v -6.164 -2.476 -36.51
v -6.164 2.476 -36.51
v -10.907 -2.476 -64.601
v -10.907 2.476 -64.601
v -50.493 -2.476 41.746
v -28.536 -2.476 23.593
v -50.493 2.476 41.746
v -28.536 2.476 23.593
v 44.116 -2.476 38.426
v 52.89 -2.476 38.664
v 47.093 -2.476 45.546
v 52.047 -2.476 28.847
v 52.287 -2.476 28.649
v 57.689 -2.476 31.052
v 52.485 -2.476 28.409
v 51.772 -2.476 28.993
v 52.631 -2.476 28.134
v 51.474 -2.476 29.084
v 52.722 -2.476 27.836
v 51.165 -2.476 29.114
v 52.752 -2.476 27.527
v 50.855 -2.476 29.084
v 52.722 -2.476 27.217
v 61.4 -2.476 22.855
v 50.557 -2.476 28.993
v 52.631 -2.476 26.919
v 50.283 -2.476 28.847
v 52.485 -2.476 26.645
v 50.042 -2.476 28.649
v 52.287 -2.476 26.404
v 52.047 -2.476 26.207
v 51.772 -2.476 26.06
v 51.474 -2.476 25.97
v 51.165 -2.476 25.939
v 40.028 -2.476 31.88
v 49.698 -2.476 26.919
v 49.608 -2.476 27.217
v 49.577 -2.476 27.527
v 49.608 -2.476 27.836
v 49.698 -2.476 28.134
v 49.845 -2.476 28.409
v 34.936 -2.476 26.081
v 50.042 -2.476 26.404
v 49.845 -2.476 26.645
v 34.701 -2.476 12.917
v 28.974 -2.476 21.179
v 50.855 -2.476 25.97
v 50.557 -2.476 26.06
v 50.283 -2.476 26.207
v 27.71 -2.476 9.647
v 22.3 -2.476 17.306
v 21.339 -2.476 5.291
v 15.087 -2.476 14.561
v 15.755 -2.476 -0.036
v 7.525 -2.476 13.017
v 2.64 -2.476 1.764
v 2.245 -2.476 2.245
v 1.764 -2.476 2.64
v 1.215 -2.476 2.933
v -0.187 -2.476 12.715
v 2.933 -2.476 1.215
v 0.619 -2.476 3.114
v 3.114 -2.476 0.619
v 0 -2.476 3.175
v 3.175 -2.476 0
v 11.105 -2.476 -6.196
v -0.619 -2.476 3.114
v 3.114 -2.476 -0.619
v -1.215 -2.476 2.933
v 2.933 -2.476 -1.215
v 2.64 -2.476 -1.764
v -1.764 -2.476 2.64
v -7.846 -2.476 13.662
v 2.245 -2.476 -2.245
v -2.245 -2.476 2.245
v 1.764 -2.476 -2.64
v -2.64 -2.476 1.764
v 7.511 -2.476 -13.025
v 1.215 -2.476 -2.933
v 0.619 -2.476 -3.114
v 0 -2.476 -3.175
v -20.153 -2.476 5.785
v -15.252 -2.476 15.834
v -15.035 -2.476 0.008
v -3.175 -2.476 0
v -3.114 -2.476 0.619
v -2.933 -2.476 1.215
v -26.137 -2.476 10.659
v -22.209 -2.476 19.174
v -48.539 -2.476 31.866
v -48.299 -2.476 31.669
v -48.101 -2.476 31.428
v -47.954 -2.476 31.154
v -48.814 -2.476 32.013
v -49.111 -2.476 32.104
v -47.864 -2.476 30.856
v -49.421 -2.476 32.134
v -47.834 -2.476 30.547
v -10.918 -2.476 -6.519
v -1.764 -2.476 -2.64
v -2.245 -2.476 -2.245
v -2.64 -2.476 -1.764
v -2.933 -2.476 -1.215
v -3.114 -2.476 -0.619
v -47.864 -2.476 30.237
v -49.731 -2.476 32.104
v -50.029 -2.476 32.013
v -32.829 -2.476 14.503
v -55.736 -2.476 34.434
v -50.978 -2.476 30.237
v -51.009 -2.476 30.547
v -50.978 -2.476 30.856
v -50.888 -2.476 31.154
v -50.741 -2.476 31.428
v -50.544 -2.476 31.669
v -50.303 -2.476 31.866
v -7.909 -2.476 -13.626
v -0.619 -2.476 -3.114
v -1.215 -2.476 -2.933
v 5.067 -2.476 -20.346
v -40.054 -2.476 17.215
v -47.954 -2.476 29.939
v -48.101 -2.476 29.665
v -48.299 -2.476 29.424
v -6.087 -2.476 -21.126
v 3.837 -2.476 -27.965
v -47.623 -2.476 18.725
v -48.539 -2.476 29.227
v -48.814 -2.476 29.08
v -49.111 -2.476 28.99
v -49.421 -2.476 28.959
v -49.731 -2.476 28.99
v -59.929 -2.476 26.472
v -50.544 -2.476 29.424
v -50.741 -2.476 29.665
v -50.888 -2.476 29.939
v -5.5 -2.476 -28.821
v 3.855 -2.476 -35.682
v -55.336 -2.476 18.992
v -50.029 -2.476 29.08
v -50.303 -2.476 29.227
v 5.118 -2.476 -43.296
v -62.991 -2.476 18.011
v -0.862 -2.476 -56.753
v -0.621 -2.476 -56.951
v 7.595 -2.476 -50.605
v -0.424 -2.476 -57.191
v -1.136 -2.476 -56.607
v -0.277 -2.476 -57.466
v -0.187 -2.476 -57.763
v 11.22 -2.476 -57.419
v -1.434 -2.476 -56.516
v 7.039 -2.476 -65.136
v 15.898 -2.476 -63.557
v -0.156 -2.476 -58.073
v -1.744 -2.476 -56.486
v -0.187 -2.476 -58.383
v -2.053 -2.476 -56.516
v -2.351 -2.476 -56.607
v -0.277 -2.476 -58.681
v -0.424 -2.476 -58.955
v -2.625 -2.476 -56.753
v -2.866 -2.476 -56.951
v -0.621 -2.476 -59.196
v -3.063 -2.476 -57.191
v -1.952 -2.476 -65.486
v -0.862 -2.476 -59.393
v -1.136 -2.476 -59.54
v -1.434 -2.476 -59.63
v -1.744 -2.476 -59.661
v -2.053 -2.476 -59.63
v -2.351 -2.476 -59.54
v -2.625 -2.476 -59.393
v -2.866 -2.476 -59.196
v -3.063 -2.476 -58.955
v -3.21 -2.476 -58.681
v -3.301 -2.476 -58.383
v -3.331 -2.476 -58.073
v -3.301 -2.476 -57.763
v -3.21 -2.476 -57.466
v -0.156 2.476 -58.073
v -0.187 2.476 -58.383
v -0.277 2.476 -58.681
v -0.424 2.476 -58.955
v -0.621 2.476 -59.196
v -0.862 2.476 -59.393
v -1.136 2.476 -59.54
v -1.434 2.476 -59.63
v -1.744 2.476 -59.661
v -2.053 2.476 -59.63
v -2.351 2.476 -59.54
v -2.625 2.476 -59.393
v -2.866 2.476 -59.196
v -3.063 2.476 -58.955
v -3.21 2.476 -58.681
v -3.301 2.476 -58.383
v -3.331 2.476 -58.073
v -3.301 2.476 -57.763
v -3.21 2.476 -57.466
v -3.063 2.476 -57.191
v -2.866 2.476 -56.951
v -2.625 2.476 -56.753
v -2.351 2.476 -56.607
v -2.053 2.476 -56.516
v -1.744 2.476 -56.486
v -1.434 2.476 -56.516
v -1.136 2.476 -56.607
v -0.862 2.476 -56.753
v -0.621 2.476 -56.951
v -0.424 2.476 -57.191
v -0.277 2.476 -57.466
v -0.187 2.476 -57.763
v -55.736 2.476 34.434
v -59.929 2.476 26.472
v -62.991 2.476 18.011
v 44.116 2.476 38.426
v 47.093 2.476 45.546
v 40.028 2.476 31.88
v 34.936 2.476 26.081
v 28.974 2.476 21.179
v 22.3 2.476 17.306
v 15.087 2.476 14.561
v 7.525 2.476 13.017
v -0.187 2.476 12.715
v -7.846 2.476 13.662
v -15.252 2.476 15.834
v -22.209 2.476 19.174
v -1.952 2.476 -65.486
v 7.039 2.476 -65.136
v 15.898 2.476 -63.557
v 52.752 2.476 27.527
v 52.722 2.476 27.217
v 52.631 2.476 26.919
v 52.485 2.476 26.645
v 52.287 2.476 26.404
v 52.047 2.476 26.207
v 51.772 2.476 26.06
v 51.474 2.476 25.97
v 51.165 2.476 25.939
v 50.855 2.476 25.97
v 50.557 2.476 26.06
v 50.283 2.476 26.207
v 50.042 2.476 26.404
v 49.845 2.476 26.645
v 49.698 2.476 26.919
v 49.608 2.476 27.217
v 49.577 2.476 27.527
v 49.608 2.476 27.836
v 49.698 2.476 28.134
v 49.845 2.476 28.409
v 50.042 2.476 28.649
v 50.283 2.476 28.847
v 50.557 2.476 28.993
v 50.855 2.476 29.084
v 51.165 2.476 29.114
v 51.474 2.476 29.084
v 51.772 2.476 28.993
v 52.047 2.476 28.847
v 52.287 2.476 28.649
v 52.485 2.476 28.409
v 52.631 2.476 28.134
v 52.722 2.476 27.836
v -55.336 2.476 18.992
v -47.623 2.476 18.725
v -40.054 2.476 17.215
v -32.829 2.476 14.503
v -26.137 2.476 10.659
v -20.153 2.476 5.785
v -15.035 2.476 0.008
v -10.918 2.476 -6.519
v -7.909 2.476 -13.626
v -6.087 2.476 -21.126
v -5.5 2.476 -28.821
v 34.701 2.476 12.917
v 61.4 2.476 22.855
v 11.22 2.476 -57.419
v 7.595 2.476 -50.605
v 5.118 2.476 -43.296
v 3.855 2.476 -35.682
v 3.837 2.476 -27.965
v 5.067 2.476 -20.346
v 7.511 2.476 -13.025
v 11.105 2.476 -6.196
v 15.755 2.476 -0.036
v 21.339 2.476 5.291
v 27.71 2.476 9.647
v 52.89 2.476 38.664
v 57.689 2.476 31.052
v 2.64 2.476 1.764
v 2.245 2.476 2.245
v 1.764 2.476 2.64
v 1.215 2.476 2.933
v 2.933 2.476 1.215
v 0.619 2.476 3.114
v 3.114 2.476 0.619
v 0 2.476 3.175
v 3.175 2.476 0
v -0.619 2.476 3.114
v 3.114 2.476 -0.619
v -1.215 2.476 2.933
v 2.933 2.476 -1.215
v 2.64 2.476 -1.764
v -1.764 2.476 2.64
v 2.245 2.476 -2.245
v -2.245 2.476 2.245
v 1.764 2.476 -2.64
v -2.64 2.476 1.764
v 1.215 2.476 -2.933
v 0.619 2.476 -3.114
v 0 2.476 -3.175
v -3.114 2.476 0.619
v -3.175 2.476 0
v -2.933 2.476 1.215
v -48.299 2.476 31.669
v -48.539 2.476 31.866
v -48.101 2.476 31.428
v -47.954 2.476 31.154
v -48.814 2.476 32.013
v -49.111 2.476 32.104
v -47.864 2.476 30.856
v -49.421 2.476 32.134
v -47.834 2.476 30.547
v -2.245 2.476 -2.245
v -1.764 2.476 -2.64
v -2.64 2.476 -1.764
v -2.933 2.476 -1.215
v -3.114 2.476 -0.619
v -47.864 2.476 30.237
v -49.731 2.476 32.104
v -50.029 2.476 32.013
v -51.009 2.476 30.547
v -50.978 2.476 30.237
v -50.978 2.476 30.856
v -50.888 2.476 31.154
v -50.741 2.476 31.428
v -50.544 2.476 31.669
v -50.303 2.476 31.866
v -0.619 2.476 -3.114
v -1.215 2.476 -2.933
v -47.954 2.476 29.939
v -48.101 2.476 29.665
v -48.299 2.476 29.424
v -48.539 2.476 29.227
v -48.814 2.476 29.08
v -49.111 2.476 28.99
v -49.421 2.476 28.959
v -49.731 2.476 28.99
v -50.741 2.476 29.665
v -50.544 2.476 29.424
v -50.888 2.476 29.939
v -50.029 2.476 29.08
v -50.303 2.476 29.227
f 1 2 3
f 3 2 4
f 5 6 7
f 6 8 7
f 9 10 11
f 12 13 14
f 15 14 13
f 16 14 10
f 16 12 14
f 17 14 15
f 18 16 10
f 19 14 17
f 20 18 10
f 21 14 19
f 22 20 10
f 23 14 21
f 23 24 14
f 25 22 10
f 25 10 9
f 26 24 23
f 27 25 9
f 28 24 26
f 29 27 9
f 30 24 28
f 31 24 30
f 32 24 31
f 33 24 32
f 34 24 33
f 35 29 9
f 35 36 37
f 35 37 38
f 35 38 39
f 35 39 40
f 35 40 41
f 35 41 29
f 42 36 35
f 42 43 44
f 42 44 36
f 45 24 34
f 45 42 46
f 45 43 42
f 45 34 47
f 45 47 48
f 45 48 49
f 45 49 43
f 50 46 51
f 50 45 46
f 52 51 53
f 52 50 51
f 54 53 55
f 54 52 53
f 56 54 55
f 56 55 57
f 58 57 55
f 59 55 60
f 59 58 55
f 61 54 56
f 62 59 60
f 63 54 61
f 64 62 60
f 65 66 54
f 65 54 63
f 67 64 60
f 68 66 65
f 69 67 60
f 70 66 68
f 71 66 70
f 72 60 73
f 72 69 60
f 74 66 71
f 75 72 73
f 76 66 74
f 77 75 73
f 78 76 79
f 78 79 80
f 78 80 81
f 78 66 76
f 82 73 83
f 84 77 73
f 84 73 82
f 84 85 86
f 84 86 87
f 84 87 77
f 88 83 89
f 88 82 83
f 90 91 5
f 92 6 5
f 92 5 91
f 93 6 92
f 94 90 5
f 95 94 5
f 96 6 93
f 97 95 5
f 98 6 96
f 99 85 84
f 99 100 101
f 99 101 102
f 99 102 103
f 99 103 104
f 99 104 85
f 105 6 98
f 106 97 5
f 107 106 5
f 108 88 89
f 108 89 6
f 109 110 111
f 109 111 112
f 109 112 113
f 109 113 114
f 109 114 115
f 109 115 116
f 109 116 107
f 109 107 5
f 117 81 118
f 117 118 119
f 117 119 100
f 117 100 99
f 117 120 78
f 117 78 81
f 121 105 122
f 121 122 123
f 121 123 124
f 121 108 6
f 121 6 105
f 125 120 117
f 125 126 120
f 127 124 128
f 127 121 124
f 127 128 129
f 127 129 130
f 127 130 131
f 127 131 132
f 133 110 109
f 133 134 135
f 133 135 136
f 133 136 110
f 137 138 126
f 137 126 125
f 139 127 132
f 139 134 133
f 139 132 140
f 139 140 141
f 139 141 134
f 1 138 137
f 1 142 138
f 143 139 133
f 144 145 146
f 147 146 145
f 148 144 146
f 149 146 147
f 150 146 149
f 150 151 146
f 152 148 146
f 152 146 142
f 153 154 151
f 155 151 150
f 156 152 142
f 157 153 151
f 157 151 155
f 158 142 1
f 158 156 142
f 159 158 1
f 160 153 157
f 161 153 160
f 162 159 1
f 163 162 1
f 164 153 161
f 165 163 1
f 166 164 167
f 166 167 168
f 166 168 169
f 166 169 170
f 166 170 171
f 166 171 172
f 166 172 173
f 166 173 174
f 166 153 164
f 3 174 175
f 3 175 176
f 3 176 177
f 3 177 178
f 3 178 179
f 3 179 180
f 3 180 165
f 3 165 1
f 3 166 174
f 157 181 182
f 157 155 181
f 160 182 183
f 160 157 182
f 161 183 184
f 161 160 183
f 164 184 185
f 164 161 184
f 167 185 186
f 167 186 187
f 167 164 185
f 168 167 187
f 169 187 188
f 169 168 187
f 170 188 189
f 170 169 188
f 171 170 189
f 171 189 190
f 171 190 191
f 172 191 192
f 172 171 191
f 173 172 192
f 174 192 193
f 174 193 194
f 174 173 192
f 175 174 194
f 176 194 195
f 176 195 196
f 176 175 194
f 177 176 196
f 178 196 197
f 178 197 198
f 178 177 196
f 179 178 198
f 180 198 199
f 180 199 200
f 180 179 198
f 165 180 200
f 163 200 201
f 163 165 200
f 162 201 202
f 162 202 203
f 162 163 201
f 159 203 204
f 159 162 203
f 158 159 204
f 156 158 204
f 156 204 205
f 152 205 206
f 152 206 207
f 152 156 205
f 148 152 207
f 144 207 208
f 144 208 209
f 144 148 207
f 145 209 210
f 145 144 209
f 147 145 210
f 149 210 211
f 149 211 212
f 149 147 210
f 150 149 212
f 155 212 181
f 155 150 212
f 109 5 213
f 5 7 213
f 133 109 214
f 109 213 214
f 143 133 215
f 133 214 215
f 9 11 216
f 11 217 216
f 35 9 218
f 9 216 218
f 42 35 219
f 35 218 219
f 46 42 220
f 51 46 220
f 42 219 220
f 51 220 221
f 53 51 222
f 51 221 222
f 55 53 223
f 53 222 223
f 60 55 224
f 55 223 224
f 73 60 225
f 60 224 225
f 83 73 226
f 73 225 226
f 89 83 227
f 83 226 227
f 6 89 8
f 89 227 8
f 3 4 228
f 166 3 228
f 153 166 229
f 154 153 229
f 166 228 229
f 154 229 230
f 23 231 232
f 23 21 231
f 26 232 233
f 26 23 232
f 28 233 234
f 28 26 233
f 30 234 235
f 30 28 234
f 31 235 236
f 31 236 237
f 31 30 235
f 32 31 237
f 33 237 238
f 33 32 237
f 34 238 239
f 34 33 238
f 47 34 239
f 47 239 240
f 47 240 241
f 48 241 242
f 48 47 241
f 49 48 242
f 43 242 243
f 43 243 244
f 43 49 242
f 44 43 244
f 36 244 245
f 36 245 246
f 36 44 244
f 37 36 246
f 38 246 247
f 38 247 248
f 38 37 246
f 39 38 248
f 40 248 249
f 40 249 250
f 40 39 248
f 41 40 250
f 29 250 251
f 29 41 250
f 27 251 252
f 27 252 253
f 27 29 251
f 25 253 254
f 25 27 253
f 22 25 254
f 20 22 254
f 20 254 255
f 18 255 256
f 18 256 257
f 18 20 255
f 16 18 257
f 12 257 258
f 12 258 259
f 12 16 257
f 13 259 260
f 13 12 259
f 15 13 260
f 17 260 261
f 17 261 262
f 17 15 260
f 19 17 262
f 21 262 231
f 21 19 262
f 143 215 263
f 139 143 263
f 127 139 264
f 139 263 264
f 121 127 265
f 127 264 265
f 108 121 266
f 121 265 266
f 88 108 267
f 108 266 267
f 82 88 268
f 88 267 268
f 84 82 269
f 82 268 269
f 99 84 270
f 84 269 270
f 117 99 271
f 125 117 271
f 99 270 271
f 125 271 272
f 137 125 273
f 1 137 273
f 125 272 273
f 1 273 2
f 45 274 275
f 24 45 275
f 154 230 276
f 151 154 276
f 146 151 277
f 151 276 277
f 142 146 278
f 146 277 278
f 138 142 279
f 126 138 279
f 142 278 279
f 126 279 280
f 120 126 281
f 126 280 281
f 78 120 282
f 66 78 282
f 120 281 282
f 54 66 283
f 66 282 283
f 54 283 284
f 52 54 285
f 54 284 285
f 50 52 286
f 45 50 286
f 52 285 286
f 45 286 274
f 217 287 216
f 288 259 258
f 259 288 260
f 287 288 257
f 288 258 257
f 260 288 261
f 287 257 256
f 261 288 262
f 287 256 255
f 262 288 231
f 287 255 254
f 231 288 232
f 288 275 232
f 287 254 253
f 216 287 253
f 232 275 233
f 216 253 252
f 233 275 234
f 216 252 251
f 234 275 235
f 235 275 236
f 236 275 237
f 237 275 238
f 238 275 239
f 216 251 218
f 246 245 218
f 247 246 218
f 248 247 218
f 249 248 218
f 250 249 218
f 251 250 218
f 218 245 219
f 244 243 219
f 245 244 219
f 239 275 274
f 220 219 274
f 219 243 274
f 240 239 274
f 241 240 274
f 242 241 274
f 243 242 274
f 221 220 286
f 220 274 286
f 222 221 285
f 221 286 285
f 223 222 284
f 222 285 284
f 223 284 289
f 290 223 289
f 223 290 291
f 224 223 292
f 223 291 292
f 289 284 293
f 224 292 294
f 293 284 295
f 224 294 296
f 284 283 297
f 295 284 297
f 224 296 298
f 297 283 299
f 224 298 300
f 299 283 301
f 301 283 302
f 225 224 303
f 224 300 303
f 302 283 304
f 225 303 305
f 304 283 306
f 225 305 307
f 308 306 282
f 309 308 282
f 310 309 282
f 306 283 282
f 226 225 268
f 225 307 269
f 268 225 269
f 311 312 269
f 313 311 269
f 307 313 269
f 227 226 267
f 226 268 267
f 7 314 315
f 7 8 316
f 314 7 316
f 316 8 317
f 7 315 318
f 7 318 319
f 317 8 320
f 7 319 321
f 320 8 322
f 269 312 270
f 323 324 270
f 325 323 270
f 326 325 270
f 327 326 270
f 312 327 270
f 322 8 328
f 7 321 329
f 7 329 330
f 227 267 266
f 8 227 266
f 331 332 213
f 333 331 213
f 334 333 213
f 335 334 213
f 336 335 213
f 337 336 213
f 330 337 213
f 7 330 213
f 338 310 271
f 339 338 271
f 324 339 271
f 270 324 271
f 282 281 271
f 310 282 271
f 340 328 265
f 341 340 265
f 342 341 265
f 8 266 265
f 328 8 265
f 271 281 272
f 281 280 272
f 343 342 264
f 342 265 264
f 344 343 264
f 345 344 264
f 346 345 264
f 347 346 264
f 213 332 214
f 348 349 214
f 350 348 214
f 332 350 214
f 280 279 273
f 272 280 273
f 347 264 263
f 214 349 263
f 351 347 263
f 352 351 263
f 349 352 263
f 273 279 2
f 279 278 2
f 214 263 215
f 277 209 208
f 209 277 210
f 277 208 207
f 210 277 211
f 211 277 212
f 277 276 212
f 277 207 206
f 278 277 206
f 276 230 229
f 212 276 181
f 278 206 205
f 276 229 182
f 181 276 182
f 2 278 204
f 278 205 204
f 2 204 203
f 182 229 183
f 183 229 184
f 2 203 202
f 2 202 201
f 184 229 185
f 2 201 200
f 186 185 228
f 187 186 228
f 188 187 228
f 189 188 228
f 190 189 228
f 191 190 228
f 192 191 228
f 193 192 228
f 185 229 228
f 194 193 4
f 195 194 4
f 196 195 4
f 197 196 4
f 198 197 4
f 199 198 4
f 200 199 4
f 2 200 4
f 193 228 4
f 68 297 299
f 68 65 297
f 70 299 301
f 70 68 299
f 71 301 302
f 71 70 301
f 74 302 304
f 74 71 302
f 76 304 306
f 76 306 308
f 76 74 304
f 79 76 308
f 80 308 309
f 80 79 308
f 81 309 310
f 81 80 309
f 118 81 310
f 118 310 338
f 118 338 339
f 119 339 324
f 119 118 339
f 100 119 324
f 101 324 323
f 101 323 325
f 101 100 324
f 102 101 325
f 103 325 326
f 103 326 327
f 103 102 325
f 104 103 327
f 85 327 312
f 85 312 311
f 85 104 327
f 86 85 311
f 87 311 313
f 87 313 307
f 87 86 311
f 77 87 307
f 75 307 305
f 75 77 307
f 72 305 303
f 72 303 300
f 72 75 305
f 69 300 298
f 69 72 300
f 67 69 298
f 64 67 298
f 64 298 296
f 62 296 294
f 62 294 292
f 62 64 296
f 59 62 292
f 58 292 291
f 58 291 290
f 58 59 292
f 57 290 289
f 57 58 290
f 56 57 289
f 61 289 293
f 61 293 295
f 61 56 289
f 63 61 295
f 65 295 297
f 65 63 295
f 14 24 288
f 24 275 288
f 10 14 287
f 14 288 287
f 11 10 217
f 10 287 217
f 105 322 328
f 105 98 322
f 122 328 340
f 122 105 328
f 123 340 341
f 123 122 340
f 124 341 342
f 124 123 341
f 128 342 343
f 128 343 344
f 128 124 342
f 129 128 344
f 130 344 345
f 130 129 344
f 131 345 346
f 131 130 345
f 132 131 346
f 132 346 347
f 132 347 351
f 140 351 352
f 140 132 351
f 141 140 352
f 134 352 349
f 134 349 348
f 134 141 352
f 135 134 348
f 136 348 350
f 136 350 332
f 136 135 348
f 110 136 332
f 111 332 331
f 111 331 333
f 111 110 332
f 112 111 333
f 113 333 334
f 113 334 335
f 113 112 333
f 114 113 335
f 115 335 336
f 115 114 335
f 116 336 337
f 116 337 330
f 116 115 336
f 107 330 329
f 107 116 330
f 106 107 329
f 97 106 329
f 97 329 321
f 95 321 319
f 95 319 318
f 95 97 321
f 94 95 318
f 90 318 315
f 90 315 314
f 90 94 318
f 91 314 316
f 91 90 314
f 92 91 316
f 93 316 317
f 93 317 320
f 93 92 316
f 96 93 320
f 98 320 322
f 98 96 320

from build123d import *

# Parameters (mm, degrees)
SKETCH1_R           = 3.175
SKETCH1_R_2         = 1.5875
BOSS_EXTRUDE1_DEPTH = 2.4765


with BuildPart() as part:
    # Sketch1 → Boss-Extrude1 (new, symmetric)
    with BuildSketch(Plane(origin=(0, 0, 0), x_dir=(1, 0, 0), z_dir=(0, 1, 0))):
        with BuildLine():
            Line((34.700549349, -12.916534941), (61.399556839, -22.854667611))
            ThreePointArc((61.399556839, -22.854667611), (55.420174256, -34.940602415), (47.093148029, -45.546424892))
            ThreePointArc((47.093148029, -45.546424892), (15.086508303, -14.560725649), (-28.536322062, -23.593289791))
            Line((-28.536322062, -23.593289791), (-50.492501165, -41.746242199))
            ThreePointArc((-50.492501165, -41.746242199), (-57.969536443, -30.52497758), (-62.990935022, -18.010650091))
            ThreePointArc((-62.990935022, -18.010650091), (-20.153212462, -5.78493662), (-6.164227287, 36.509824732))
            Line((-6.164227287, 36.509824732), (-10.907055674, 64.600909809))
            ThreePointArc((-10.907055674, 64.600909809), (2.549362187, 65.465579995), (15.897786993, 63.557074983))
            ThreePointArc((15.897786993, 63.557074983), (5.066704158, 20.34566227), (34.700549349, -12.916534941))
        make_face()
        Circle(SKETCH1_R, mode=Mode.SUBTRACT)
        with Locations((-1.743506635, 58.073174541)):
            Circle(SKETCH1_R_2, mode=Mode.SUBTRACT)
        with Locations((-49.421091113, -30.546508308)):
            Circle(SKETCH1_R_2, mode=Mode.SUBTRACT)
        with Locations((51.164597749, -27.526666233)):
            Circle(SKETCH1_R_2, mode=Mode.SUBTRACT)
    extrude(amount=BOSS_EXTRUDE1_DEPTH, both=True)


solid = part.part
